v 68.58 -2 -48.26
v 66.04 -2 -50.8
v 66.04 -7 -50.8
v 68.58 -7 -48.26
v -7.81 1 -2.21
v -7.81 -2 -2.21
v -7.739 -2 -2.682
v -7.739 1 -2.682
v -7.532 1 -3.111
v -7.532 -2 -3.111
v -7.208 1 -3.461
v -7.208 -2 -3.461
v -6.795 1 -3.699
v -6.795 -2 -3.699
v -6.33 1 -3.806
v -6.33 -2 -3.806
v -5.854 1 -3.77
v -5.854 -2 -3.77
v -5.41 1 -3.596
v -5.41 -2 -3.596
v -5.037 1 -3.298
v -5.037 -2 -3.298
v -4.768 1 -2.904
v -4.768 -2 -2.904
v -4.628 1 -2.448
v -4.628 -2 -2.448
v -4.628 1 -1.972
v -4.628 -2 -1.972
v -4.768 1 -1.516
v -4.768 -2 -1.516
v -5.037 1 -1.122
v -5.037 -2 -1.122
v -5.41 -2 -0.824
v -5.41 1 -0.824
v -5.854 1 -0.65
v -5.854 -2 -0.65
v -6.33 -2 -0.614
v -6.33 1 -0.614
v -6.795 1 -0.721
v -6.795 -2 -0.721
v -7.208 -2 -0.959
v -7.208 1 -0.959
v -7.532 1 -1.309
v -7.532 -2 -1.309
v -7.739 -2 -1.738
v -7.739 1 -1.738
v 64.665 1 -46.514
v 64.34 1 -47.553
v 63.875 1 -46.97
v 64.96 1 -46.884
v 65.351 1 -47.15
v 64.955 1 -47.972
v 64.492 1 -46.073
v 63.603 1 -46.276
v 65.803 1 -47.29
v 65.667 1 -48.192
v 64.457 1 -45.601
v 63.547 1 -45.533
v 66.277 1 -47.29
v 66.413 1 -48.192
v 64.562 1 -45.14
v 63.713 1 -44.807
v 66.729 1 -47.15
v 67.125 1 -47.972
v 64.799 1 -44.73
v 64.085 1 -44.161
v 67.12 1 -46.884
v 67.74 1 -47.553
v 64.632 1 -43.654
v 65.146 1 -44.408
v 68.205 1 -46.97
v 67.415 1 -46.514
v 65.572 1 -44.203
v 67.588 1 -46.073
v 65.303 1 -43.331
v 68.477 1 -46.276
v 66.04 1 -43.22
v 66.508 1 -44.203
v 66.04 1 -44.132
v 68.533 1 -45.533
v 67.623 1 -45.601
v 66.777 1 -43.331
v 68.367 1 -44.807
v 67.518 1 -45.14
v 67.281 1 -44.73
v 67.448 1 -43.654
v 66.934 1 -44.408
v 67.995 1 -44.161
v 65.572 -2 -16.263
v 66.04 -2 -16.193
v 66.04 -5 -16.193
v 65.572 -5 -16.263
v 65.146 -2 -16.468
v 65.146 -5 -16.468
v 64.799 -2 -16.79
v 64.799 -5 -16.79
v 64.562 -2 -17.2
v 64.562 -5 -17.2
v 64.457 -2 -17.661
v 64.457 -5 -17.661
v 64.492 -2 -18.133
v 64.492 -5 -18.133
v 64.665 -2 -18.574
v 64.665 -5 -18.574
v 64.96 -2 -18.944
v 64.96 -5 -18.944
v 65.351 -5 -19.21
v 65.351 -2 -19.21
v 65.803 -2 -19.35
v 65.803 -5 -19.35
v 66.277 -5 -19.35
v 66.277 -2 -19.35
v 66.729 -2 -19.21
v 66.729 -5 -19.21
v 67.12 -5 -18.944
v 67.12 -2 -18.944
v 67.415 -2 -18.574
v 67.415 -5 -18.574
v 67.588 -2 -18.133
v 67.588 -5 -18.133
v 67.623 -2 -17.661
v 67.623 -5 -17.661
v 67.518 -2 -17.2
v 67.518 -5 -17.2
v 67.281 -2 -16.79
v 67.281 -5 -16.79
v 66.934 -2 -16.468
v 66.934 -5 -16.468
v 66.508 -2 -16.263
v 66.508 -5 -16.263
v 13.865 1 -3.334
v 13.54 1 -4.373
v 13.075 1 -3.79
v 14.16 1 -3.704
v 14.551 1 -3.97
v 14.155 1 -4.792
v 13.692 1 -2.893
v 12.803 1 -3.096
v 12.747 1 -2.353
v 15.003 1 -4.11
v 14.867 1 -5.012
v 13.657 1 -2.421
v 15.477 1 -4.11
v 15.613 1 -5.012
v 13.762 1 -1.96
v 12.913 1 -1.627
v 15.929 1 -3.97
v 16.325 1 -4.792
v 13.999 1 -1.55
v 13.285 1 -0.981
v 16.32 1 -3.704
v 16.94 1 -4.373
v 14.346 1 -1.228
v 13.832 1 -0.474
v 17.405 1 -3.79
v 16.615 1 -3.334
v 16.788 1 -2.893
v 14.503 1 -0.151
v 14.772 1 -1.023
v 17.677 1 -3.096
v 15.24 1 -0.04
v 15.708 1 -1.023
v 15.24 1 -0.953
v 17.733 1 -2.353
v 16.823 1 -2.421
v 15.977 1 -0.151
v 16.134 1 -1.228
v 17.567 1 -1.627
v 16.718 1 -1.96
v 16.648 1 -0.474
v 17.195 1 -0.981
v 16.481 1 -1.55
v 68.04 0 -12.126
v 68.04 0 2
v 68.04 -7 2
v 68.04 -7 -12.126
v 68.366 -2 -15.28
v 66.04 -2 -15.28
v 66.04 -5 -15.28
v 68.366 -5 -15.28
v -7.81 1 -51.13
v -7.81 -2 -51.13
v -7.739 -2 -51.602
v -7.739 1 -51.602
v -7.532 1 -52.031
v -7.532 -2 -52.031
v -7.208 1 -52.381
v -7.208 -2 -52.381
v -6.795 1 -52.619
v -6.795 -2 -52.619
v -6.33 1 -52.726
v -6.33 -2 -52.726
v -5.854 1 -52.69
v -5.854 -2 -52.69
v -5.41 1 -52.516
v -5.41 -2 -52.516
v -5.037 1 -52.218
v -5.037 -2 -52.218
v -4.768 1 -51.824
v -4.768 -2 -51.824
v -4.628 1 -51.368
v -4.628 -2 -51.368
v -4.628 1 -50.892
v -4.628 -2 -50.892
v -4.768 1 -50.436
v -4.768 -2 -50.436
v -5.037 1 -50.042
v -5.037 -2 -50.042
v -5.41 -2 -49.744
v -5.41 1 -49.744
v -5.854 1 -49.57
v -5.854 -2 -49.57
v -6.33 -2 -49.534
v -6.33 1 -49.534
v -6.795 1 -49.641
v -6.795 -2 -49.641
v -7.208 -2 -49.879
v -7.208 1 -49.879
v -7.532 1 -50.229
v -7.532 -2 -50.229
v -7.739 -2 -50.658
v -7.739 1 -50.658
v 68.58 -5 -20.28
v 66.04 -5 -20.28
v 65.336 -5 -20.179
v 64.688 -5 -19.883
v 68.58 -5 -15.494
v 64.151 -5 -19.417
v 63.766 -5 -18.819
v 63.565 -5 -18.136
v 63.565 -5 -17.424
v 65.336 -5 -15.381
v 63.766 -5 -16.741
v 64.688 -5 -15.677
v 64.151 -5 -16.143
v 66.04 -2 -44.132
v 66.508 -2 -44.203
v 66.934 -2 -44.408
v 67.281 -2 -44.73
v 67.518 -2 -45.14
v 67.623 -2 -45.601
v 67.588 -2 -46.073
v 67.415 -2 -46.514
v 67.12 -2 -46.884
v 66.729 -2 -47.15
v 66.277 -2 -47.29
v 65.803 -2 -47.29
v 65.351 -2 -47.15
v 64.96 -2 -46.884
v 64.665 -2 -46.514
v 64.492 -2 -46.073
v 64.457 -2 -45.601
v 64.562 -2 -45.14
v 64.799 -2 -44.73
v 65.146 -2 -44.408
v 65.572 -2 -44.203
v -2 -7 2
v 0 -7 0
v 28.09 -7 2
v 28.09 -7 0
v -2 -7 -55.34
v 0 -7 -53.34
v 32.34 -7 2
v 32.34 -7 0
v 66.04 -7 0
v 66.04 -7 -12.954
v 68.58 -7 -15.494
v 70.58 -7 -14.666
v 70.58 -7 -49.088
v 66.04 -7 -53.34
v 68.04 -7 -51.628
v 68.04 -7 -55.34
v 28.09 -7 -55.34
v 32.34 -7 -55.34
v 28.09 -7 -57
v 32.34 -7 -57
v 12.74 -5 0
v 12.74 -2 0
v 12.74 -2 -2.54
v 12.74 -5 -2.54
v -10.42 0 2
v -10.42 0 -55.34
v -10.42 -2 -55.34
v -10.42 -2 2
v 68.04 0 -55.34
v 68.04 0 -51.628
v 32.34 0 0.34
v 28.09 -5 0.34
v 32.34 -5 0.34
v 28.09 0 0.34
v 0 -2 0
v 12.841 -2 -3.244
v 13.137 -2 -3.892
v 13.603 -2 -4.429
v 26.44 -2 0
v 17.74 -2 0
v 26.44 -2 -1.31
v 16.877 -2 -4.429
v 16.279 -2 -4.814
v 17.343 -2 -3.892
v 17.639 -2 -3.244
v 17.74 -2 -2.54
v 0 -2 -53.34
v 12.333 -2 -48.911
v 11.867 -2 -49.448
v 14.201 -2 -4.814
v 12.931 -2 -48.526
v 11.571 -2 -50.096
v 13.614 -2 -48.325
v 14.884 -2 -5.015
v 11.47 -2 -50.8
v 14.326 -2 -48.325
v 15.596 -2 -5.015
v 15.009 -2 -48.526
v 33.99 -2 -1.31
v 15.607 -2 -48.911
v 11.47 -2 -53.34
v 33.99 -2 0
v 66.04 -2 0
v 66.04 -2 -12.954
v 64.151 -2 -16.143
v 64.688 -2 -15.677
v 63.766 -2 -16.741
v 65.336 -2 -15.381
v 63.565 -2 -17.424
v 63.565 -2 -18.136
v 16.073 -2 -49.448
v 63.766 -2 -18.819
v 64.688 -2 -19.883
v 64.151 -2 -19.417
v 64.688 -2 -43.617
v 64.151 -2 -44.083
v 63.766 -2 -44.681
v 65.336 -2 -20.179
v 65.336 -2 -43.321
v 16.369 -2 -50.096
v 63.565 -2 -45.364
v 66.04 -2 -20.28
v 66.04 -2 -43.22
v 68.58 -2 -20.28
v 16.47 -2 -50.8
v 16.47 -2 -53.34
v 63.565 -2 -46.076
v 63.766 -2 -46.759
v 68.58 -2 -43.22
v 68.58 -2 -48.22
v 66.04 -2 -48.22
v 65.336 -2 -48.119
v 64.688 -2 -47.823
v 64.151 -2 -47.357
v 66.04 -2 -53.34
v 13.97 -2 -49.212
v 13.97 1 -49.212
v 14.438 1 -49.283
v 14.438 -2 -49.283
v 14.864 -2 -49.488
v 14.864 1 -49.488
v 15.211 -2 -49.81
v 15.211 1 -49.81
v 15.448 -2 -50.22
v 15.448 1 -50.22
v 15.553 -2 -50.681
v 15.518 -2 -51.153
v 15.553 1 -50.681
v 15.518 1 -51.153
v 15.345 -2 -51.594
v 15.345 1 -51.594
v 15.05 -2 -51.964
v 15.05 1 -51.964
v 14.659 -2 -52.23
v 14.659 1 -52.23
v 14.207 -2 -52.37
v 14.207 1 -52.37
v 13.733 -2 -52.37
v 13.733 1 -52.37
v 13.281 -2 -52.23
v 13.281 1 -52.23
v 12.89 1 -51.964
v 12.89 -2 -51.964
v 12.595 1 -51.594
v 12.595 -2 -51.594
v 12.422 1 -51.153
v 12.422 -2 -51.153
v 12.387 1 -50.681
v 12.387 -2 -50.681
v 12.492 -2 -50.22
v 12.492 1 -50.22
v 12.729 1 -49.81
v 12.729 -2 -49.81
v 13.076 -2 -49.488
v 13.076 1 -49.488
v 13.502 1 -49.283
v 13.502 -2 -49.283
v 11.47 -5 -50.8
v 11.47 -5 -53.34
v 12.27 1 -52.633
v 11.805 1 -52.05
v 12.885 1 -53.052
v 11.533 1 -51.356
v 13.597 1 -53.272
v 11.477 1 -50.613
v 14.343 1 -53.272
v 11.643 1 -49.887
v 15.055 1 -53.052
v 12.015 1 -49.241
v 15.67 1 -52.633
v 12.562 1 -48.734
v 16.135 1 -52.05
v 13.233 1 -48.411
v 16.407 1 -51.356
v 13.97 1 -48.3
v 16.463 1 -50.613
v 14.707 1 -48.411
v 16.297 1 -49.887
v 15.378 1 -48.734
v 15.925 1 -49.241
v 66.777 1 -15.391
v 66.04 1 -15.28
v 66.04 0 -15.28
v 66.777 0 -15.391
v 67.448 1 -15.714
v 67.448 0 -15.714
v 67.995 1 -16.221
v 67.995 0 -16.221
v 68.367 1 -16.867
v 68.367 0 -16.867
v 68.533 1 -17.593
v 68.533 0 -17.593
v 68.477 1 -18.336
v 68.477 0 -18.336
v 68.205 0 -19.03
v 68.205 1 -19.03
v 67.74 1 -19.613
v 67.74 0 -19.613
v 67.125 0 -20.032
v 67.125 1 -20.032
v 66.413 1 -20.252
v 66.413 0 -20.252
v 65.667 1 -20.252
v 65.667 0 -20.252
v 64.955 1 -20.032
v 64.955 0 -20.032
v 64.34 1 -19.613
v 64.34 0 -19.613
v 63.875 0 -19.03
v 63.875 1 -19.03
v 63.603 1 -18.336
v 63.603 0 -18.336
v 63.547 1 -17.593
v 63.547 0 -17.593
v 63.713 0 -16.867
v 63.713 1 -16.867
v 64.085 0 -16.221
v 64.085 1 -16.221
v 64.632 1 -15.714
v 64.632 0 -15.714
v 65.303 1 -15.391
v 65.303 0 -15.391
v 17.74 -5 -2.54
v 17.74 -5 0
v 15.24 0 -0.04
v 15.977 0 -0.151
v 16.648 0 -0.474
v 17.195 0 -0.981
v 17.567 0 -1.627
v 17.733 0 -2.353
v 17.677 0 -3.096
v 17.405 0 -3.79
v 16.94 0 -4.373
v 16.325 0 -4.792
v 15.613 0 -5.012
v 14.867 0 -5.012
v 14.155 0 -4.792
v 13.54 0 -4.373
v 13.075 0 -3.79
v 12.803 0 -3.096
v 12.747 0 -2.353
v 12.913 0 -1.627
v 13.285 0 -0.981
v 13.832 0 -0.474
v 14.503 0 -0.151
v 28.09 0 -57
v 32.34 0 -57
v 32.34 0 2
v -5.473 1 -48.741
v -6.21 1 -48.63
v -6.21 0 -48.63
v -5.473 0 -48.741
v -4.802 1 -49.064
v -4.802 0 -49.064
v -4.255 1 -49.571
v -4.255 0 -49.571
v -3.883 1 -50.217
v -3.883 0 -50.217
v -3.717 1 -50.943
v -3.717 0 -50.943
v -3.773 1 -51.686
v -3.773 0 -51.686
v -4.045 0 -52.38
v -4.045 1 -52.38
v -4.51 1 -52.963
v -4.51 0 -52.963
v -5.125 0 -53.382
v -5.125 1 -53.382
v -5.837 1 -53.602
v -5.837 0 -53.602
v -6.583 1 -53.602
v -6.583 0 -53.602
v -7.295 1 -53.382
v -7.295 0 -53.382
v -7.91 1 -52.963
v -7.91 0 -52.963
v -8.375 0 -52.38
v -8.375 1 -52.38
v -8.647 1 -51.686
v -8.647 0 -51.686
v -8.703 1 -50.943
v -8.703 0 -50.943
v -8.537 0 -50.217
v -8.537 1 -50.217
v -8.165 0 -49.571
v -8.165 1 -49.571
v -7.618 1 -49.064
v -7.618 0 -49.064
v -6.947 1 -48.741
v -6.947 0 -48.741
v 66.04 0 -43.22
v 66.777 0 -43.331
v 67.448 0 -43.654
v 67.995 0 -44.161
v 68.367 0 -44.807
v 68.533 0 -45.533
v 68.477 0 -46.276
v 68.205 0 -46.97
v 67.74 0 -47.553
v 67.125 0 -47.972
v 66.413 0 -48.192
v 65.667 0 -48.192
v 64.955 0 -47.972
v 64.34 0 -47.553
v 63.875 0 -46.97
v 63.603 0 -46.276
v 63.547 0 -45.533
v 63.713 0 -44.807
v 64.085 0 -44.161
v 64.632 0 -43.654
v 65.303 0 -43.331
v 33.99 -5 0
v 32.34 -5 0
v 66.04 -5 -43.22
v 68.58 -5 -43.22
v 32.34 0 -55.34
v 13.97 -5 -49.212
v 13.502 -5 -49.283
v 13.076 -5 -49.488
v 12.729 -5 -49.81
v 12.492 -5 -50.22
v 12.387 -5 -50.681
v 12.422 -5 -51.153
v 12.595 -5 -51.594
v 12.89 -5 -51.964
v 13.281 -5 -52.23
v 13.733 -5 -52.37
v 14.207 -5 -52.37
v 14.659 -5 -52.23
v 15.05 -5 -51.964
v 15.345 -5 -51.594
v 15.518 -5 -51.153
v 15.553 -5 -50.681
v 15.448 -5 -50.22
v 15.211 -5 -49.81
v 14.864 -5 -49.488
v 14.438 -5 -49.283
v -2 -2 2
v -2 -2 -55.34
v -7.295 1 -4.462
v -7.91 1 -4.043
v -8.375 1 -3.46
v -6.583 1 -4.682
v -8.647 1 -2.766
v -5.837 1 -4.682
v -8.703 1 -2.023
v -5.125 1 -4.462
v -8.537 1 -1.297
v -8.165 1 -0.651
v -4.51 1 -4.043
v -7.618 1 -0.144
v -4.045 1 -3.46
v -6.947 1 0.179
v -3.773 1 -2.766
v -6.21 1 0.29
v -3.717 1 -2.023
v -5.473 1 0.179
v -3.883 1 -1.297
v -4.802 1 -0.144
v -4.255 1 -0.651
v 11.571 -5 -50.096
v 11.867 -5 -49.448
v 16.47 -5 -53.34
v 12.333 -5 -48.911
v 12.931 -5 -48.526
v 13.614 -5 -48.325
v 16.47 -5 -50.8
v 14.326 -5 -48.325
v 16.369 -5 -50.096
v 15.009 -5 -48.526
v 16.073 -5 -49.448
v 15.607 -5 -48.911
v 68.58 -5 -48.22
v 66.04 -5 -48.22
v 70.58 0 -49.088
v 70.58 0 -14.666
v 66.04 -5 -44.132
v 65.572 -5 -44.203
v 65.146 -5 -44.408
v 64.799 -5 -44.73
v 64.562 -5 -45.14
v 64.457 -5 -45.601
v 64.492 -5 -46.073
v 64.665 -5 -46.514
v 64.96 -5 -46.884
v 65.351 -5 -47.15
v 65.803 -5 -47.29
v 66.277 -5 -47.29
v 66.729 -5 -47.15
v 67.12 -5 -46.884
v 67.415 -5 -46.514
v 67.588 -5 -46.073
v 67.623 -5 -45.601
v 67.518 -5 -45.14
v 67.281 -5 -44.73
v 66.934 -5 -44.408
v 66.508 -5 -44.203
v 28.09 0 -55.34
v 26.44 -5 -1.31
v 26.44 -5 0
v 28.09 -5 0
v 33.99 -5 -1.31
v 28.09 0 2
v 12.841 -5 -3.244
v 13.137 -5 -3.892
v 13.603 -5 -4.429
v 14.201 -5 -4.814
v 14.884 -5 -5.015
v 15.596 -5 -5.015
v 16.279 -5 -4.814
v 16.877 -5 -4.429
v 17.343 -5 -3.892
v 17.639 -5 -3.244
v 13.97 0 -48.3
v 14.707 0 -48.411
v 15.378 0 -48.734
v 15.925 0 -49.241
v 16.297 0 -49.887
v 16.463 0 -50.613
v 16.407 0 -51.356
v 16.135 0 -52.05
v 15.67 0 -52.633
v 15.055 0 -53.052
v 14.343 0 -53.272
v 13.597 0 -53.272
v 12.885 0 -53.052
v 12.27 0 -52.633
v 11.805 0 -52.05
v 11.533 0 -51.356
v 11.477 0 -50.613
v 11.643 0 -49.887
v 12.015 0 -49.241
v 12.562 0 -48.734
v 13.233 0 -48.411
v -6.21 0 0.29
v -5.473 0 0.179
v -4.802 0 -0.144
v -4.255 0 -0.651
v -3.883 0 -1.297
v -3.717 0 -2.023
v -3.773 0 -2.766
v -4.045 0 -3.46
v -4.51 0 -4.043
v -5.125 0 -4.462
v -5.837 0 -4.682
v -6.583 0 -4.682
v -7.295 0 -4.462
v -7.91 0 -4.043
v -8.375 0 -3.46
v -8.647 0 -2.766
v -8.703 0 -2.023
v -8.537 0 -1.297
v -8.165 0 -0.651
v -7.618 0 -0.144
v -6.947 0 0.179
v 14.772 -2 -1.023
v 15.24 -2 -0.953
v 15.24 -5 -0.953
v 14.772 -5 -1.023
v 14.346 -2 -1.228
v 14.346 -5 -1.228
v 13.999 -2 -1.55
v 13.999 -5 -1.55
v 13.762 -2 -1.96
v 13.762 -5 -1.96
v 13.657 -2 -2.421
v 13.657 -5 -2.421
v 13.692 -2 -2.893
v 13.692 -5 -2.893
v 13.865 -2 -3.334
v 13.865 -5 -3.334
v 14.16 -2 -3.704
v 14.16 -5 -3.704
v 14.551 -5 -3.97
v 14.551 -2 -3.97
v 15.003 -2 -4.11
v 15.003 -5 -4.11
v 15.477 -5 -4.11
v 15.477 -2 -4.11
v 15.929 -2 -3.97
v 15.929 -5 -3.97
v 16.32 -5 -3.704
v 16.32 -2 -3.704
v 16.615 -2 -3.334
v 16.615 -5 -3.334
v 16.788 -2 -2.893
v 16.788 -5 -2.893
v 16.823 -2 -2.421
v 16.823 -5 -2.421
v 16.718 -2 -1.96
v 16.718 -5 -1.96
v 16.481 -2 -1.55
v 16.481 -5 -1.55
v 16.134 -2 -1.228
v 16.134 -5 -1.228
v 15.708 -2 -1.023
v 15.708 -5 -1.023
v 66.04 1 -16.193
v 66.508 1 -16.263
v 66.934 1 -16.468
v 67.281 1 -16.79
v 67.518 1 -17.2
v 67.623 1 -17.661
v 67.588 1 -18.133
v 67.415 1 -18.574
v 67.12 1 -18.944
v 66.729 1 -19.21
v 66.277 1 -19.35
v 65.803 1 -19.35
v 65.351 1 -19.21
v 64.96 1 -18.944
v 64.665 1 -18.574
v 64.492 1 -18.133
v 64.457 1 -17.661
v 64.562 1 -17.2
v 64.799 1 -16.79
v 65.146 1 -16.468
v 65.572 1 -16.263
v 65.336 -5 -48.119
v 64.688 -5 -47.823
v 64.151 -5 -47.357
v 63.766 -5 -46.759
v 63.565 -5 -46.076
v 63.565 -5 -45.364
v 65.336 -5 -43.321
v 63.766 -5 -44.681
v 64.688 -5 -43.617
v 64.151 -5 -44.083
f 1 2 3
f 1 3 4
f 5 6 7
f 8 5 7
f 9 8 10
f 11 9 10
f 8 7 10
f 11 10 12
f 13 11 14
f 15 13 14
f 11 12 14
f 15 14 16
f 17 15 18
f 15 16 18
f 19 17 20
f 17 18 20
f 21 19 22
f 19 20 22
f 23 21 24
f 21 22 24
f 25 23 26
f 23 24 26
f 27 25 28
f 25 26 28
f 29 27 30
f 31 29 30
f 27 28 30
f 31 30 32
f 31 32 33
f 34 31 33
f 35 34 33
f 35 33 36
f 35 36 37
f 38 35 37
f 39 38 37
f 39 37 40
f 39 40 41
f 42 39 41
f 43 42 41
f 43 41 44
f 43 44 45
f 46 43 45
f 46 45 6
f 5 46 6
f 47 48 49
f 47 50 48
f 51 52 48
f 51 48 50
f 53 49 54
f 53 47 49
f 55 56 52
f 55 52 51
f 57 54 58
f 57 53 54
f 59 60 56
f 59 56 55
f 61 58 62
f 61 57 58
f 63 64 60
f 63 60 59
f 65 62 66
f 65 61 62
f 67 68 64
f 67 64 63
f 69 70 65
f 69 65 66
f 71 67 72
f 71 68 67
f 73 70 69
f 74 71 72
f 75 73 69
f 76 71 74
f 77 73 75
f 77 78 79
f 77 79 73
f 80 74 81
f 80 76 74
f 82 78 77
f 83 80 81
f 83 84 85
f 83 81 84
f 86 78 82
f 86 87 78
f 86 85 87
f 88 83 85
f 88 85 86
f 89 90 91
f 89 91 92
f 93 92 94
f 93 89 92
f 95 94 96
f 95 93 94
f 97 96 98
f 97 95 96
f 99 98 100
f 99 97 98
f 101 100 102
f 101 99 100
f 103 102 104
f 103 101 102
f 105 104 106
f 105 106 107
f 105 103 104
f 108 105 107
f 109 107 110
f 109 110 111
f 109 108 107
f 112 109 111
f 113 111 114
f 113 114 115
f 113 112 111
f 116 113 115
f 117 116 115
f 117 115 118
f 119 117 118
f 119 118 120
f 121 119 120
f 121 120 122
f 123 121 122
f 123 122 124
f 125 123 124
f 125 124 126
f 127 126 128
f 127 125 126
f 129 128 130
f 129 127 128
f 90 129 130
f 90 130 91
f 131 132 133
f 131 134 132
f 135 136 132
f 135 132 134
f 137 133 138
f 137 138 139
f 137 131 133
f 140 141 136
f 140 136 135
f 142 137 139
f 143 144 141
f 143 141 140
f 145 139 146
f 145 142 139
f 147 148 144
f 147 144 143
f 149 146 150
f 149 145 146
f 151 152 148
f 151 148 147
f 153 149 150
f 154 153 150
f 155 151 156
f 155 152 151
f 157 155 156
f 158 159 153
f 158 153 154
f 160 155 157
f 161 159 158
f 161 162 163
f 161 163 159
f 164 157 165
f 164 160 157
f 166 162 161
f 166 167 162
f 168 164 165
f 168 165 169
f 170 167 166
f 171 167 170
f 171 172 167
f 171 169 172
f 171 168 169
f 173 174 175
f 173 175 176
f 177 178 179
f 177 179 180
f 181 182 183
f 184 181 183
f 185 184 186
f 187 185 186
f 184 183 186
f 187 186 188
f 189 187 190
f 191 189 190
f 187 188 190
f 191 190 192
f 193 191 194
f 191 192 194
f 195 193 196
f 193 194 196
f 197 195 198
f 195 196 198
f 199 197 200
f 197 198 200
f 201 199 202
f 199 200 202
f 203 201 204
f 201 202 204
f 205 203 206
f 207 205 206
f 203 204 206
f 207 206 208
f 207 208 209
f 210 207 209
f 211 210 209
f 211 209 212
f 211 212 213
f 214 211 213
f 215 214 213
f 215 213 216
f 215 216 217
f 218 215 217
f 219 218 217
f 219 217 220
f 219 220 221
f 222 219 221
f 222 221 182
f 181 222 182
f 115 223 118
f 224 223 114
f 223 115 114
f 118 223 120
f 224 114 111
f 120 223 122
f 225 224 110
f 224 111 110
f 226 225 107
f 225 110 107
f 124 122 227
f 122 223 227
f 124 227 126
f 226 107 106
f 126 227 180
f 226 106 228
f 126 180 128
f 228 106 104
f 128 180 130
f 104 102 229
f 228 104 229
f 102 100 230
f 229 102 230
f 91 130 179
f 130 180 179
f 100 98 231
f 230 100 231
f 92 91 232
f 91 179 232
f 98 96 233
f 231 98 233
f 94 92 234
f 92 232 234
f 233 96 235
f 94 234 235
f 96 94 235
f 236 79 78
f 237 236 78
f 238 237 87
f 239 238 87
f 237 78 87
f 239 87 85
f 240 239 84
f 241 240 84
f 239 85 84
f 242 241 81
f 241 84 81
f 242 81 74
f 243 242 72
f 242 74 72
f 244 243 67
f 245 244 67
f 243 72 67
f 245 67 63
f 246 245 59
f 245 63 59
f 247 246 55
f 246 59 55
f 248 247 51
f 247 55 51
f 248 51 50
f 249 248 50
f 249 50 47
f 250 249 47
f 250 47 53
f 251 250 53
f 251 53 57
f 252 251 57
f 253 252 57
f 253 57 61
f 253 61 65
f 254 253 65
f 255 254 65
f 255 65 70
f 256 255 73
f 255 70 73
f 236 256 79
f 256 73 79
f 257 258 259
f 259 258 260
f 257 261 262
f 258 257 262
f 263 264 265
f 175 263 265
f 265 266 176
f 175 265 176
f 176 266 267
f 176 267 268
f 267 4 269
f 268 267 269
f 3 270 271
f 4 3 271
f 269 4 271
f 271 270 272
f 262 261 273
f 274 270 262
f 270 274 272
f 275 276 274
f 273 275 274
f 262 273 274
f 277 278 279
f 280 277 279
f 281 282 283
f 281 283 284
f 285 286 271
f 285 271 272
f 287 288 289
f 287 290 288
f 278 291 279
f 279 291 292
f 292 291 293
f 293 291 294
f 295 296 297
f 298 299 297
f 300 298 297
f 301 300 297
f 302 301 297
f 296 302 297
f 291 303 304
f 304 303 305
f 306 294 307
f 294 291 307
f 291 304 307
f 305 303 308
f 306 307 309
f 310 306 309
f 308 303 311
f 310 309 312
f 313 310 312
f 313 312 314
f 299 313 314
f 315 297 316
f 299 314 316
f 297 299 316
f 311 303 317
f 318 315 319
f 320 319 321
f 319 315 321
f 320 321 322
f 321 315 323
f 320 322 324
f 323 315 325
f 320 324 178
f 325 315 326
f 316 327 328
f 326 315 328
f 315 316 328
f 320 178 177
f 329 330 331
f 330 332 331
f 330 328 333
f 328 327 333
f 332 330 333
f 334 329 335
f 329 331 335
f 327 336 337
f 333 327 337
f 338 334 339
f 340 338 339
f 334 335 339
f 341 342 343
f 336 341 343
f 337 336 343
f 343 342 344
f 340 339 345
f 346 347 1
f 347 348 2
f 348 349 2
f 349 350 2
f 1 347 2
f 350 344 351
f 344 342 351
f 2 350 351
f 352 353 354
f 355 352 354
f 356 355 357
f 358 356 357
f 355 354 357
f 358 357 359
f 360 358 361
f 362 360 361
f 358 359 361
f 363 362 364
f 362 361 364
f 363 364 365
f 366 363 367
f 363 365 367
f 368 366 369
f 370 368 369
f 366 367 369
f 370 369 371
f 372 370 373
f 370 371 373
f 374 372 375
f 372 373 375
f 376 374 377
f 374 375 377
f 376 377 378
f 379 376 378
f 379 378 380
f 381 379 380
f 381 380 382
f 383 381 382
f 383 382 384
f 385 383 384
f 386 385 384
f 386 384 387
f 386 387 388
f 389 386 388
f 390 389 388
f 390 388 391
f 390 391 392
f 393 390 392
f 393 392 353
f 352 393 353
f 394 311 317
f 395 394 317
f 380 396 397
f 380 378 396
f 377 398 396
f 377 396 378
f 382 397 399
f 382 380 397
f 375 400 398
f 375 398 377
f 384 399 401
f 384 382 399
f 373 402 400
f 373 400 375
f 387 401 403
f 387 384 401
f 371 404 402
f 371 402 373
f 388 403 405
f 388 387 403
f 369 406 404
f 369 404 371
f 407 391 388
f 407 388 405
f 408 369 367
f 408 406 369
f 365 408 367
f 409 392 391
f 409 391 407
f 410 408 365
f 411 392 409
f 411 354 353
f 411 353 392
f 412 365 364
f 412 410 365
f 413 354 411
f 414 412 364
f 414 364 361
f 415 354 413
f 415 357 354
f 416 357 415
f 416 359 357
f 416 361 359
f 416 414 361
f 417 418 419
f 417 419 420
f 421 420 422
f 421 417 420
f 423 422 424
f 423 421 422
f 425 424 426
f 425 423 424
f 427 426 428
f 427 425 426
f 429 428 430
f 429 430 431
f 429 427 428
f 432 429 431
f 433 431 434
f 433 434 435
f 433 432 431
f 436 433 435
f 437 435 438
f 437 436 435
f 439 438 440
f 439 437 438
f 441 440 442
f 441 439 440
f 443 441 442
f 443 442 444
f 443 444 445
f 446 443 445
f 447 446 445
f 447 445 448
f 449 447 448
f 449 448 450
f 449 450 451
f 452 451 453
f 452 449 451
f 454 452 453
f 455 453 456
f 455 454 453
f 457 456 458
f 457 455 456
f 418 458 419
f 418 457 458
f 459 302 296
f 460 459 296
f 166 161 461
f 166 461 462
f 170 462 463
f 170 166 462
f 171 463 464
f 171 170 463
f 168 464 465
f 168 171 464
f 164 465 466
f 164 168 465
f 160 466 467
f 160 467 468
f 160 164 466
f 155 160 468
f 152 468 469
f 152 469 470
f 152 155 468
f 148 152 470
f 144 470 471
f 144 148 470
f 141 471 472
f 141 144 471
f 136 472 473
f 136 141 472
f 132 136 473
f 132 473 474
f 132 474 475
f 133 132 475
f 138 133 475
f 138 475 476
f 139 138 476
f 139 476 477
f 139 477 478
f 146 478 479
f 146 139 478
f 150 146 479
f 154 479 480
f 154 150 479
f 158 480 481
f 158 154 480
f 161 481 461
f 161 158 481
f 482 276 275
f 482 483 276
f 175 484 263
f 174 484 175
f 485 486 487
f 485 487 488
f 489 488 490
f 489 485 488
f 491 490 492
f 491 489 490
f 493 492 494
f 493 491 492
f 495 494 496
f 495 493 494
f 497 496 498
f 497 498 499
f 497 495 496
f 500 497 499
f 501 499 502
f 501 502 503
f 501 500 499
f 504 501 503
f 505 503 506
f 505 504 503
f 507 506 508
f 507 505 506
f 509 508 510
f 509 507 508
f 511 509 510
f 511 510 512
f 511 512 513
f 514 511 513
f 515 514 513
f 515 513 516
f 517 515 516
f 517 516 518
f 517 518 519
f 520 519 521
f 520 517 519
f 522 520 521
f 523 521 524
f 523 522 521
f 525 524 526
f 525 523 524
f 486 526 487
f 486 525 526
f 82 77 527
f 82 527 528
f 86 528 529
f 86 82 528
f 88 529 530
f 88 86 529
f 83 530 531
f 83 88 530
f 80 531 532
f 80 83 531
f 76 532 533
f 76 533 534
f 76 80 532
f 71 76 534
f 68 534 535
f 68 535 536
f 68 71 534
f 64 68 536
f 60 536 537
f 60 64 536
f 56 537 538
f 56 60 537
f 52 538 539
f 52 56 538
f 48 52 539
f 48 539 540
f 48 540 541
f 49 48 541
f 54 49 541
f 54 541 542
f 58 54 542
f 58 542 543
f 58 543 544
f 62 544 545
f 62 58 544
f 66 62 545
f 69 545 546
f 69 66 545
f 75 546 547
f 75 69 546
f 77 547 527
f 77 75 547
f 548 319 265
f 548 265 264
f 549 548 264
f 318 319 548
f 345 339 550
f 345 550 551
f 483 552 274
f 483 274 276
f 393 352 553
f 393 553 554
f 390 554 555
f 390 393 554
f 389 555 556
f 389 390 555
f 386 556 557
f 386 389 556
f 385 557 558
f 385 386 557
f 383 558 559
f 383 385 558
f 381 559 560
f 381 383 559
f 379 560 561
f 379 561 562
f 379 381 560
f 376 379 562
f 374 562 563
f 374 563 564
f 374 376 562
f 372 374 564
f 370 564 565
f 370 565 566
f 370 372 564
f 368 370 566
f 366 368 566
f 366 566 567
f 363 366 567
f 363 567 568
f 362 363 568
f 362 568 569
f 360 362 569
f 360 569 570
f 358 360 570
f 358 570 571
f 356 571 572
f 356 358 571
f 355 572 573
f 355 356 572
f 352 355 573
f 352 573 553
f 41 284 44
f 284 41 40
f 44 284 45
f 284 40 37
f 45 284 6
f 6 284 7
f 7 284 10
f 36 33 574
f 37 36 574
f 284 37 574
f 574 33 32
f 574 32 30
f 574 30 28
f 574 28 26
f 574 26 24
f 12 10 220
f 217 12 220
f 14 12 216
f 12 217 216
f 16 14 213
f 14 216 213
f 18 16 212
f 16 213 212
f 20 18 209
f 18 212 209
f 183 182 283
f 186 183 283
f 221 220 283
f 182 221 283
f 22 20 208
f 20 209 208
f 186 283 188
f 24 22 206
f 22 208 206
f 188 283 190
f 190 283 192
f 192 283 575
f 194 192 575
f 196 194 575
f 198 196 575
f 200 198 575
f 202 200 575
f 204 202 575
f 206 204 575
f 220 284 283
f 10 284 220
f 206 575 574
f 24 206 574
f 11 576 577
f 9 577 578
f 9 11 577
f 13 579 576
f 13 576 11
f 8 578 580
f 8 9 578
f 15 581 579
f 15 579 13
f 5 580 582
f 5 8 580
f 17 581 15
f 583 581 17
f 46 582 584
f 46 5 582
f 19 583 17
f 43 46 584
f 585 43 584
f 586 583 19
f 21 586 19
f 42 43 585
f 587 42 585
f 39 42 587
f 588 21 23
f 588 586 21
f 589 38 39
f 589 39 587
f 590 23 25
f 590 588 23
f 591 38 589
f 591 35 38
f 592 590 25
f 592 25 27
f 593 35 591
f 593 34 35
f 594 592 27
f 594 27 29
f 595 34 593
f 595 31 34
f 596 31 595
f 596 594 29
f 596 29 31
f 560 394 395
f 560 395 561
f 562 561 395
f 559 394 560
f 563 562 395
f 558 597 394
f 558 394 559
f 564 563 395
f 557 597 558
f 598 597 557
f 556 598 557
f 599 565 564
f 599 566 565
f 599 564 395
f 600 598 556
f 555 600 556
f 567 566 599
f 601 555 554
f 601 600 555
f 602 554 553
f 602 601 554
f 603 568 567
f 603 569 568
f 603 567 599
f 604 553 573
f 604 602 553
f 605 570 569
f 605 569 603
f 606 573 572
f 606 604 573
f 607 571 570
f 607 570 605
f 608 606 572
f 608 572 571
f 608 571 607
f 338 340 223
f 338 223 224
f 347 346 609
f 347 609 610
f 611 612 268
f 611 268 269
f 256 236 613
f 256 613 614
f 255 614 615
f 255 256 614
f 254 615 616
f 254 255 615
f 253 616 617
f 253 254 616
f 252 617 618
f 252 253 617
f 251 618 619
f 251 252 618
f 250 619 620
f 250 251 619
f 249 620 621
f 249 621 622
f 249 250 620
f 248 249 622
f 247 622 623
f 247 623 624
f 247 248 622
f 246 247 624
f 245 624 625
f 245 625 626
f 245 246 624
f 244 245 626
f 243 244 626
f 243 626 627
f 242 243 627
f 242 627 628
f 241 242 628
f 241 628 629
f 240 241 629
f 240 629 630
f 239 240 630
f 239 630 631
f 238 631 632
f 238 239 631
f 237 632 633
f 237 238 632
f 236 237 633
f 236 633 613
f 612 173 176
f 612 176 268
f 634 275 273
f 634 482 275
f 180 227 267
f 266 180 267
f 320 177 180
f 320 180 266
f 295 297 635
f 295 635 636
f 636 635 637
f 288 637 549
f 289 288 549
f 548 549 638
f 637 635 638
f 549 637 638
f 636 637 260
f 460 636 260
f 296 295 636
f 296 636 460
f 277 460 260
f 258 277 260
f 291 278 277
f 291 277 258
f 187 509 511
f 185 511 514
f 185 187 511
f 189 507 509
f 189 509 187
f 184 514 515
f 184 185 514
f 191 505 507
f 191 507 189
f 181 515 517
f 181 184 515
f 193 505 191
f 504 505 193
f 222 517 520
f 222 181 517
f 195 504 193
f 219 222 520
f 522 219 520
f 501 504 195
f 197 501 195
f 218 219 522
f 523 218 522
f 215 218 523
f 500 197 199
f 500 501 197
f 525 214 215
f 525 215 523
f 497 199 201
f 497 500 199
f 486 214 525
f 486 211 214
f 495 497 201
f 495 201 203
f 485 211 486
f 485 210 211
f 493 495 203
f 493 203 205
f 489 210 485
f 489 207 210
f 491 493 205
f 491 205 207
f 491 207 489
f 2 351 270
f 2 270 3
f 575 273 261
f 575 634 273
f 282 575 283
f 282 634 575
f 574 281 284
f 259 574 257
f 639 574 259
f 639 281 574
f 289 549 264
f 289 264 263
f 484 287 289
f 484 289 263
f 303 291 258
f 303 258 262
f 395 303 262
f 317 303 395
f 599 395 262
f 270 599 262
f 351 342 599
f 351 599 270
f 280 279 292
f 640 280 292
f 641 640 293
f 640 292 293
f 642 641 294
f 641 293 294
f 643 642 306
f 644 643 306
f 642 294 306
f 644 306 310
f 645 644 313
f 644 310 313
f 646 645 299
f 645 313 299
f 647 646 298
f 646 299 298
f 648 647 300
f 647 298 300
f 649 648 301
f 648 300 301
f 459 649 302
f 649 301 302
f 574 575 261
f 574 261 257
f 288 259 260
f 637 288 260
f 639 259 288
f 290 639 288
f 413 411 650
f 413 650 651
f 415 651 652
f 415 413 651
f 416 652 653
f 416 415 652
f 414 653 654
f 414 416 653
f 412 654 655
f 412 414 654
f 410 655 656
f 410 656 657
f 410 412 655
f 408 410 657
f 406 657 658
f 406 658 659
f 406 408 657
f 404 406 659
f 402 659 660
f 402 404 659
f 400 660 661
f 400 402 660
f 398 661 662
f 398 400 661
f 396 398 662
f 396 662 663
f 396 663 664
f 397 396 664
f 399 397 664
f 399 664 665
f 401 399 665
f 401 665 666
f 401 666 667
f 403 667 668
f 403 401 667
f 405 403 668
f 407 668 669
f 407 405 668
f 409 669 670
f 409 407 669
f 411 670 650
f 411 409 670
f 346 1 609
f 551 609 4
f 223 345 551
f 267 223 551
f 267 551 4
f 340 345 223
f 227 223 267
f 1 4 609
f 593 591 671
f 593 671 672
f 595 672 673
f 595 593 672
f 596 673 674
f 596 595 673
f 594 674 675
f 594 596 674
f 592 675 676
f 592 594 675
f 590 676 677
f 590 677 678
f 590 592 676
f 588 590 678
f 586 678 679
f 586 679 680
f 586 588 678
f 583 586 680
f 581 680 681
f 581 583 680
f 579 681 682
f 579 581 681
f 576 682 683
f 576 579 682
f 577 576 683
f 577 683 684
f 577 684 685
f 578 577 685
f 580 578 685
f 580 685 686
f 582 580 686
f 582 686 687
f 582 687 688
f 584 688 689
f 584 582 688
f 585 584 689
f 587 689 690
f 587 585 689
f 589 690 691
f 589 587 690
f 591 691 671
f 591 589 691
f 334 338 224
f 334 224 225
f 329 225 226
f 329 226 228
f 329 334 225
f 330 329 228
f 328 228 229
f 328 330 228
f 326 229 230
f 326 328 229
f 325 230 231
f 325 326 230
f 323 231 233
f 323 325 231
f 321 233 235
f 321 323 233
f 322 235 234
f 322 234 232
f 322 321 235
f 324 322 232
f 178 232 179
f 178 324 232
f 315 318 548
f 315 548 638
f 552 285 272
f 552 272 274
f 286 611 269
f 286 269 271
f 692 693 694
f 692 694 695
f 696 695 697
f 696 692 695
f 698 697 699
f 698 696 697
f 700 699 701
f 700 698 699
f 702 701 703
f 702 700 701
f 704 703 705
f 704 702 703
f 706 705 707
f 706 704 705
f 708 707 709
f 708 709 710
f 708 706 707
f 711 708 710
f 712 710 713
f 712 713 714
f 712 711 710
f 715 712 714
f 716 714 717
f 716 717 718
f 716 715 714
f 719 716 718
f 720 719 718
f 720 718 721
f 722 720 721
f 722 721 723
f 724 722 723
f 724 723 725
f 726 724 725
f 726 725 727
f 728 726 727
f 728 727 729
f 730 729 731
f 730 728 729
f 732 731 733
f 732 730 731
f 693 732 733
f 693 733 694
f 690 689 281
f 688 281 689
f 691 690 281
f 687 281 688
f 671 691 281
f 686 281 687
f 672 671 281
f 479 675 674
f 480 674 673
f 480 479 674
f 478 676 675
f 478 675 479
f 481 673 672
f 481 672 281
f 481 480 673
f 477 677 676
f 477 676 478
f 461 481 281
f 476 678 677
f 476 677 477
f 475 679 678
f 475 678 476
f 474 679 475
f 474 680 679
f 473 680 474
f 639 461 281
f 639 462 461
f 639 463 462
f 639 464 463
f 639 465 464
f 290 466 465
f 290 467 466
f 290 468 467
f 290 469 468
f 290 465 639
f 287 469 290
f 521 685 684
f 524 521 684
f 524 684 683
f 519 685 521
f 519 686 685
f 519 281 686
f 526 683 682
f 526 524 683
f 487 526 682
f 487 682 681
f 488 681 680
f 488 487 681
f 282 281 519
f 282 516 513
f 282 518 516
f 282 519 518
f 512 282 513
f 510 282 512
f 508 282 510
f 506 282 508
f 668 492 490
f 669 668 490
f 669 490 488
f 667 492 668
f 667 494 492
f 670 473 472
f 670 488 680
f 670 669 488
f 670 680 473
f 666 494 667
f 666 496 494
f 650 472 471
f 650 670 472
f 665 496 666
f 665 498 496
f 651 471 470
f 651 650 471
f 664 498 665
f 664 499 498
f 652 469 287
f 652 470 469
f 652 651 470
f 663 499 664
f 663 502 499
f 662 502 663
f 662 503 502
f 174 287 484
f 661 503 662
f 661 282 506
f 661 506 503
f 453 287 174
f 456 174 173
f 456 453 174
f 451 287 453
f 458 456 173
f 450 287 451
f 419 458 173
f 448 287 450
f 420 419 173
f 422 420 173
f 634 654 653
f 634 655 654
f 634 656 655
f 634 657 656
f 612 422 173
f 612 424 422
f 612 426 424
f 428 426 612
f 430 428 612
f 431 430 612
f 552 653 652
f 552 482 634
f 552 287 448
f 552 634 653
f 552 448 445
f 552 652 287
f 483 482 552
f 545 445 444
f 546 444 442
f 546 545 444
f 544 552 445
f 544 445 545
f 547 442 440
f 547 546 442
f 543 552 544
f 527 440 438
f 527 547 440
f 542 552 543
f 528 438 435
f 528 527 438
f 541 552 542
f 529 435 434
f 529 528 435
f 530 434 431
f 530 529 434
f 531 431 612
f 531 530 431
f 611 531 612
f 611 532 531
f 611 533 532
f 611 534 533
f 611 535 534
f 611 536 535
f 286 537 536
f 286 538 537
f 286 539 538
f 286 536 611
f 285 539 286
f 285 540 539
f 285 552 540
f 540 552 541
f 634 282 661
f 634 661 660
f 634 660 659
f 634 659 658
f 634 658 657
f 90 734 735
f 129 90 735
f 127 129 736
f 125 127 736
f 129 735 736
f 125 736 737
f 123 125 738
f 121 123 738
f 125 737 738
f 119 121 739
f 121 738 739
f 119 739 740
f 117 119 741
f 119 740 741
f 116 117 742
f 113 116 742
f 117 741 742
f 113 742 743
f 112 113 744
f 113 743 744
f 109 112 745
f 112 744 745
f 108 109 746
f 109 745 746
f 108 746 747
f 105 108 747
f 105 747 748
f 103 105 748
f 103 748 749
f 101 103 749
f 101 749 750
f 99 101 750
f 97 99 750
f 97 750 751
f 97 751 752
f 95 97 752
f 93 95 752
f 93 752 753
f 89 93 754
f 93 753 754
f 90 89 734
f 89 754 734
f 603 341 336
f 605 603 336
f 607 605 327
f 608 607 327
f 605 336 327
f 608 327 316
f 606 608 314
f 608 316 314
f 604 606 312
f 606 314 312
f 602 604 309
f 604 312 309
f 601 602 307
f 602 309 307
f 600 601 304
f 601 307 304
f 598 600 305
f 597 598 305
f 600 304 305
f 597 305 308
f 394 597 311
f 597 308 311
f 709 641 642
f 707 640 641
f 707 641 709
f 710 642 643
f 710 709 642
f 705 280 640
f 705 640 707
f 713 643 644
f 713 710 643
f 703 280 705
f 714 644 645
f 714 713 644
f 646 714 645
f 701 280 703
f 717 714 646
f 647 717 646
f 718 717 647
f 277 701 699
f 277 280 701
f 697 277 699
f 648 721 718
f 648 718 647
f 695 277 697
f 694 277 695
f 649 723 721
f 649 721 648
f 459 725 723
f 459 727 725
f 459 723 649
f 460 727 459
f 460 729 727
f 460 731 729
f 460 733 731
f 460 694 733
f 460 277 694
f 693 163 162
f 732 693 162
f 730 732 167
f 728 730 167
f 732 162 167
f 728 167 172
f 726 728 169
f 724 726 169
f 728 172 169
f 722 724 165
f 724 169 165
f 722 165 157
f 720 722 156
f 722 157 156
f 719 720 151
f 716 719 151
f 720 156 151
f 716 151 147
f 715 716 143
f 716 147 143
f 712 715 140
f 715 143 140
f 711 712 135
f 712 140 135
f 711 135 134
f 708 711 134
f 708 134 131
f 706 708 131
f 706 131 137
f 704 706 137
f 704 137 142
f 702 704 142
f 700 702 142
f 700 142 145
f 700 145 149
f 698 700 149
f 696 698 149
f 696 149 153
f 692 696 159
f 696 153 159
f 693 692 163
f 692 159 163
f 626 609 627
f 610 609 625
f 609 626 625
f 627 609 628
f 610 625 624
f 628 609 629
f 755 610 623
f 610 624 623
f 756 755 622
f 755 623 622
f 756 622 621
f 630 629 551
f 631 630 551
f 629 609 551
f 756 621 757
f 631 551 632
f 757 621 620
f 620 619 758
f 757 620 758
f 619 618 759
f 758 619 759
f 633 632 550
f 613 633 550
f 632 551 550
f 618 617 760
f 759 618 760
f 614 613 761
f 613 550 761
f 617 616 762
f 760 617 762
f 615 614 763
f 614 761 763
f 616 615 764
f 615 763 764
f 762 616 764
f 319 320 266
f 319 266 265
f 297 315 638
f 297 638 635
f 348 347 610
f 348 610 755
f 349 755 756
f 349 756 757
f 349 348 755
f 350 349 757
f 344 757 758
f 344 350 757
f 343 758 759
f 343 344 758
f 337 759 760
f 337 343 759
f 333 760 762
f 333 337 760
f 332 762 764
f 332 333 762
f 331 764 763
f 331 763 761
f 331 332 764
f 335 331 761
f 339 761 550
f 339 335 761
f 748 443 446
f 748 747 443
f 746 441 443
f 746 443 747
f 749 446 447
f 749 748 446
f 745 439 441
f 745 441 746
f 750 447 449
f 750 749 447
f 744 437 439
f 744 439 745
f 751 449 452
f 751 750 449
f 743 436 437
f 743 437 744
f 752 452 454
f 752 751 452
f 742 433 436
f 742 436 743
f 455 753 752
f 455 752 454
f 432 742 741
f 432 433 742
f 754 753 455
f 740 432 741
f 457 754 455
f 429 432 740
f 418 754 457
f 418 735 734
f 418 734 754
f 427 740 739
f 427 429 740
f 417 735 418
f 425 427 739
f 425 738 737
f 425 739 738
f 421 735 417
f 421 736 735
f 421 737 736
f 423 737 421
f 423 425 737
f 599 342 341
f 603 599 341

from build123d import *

# Parameters (mm, degrees)
SKETCH1_R            = 1.5875
BOSS_EXTRUDE1_DEPTH  = 2
BOSS_EXTRUDE2_START  = -2
BOSS_EXTRUDE2_DEPTH  = 5
BOSS_EXTRUDE3_START  = 1
SKETCH2_R            = 2.5
SKETCH2_R_2          = 1.5875
BOSS_EXTRUDE3_DEPTH  = 1
BOSS_EXTRUDE4_START  = -2
SKETCH1_4_W          = 4.25
SKETCH1_4_H          = 0.34
BOSS_EXTRUDE4_DEPTH  = 3
SKETCH3_R            = 1.5875
BOSS_EXTRUDE5_DEPTH  = 3
M3_CLEARANCE_HOLE1_D = 3.2


with BuildPart() as part:
    # Sketch1 → Boss-Extrude1 (new body)
    with BuildSketch(Plane(origin=(0, 0, 0), x_dir=(1, 0, 0), z_dir=(0, 1, 0))):
        Polygon((-10.42, 55.34), (-10.42, -2), (28.09, -2), (28.09, -0.34), (32.34, -0.34), (32.34, -2), (68.04, -2), (68.04, 12.125572875), (70.58, 14.665572875), (70.58, 49.088427125), (68.04, 51.628427125), (68.04, 55.34), (32.34, 55.34), (32.34, 57), (28.09, 57), (28.09, 55.34), align=None)
        with Locations(Location((15.24, 2.54, 0), (0, 0, 270))):
            Circle(SKETCH1_R, mode=Mode.SUBTRACT)
        with Locations(Location((66.04, 45.72, 0), (0, 0, 270))):
            Circle(SKETCH1_R, mode=Mode.SUBTRACT)
        with Locations(Location((13.97, 50.8, 0), (0, 0, 270))):
            Circle(SKETCH1_R, mode=Mode.SUBTRACT)
        with Locations(Location((66.04, 17.78, 0), (0, 0, 270))):
            Circle(SKETCH1_R, mode=Mode.SUBTRACT)
    extrude(amount=-BOSS_EXTRUDE1_DEPTH)

    # Sketch1<3> → Boss-Extrude2 (add)
    with BuildSketch(Plane(origin=(0, 0, 0), x_dir=(1, 0, 0), z_dir=(0, 1, 0)).offset(BOSS_EXTRUDE2_START)):
        Polygon((28.09, 55.34), (-2, 55.34), (-2, -2), (28.09, -2), (28.09, 0), (0, 0), (0, 53.34), (66.04, 53.34), (66.04, 50.8), (68.58, 48.26), (68.58, 15.494), (66.04, 12.954), (66.04, 0), (32.34, 0), (32.34, -2), (68.04, -2), (68.04, 12.125572875), (70.58, 14.665572875), (70.58, 49.088427125), (68.04, 51.628427125), (68.04, 55.34), (32.34, 55.34), (32.34, 57), (28.09, 57), align=None)
    extrude(amount=-BOSS_EXTRUDE2_DEPTH)

    # Sketch2 → Boss-Extrude3 (add)
    # profile 1 of 6: a face of its own
    with BuildSketch(Plane(origin=(0, 0, 0), x_dir=(1, 0, 0), z_dir=(0, 1, 0)).offset(BOSS_EXTRUDE3_START)):
        with Locations(Location((13.97, 50.8, 0), (0, 0, 270))):
            Circle(SKETCH2_R)
        with Locations(Location((13.97, 50.8, 0), (0, 0, 270))):
            Circle(SKETCH2_R_2, mode=Mode.SUBTRACT)
    # profile 2 of 6: a face of its own
    with BuildSketch(Plane(origin=(0, 0, 0), x_dir=(1, 0, 0), z_dir=(0, 1, 0)).offset(BOSS_EXTRUDE3_START)):
        with Locations(Location((66.04, 45.72, 0), (0, 0, 270))):
            Circle(SKETCH2_R)
        with Locations(Location((66.04, 45.72, 0), (0, 0, 270))):
            Circle(SKETCH2_R_2, mode=Mode.SUBTRACT)
    # profile 3 of 6: a face of its own
    with BuildSketch(Plane(origin=(0, 0, 0), x_dir=(1, 0, 0), z_dir=(0, 1, 0)).offset(BOSS_EXTRUDE3_START)):
        with Locations(Location((66.04, 17.78, 0), (0, 0, 270))):
            Circle(SKETCH2_R)
        with Locations(Location((66.04, 17.78, 0), (0, 0, 270))):
            Circle(SKETCH2_R_2, mode=Mode.SUBTRACT)
    # profile 4 of 6: a face of its own
    with BuildSketch(Plane(origin=(0, 0, 0), x_dir=(1, 0, 0), z_dir=(0, 1, 0)).offset(BOSS_EXTRUDE3_START)):
        with Locations(Location((15.24, 2.54, 0), (0, 0, 270))):
            Circle(SKETCH2_R)
        with Locations(Location((15.24, 2.54, 0), (0, 0, 270))):
            Circle(SKETCH2_R_2, mode=Mode.SUBTRACT)
    # profile 5 of 6: a face of its own
    with BuildSketch(Plane(origin=(0, 0, 0), x_dir=(1, 0, 0), z_dir=(0, 1, 0)).offset(BOSS_EXTRUDE3_START)):
        with Locations(Location((-6.21, 2.21, 0), (0, 0, 270))):
            Circle(SKETCH2_R)
    # profile 6 of 6: a face of its own
    with BuildSketch(Plane(origin=(0, 0, 0), x_dir=(1, 0, 0), z_dir=(0, 1, 0)).offset(BOSS_EXTRUDE3_START)):
        with Locations(Location((-6.21, 51.13, 0), (0, 0, 270))):
            Circle(SKETCH2_R)
    extrude(amount=-BOSS_EXTRUDE3_DEPTH)

    # Sketch1<4> → Boss-Extrude4 (add)
    with BuildSketch(Plane(origin=(0, 0, 0), x_dir=(1, 0, 0), z_dir=(0, 1, 0)).offset(BOSS_EXTRUDE4_START)):
        with Locations((30.215, -0.17)):
            Rectangle(SKETCH1_4_W, SKETCH1_4_H)
        Polygon((26.44, 0), (28.09, 0), (32.34, 0), (33.99, 0), (33.99, 1.31), (26.44, 1.31), align=None)
    extrude(amount=-BOSS_EXTRUDE4_DEPTH)

    # Sketch3 → Boss-Extrude5 (add)
    # profile 1 of 4: a face of its own
    with BuildSketch(Plane.XZ.offset(2)):
        with BuildLine():
            Line((12.74, 0), (12.74, -2.54))
            ThreePointArc((12.74, -2.54), (15.24, -5.04), (17.74, -2.54))
            Line((17.74, -2.54), (17.74, 0))
            Line((17.74, 0), (12.74, 0))
        make_face()
        with Locations(Location((15.24, -2.54, 0), (0, 0, 90))):
            Circle(SKETCH3_R, mode=Mode.SUBTRACT)
    # profile 2 of 4: a face of its own
    with BuildSketch(Plane.XZ.offset(2)):
        with BuildLine():
            Line((16.47, -53.34), (16.47, -50.8))
            ThreePointArc((16.47, -50.8), (13.97, -48.3), (11.47, -50.8))
            Line((11.47, -50.8), (11.47, -53.34))
            Line((11.47, -53.34), (16.47, -53.34))
        make_face()
        with Locations(Location((13.97, -50.8, 0), (0, 0, 90))):
            Circle(SKETCH3_R, mode=Mode.SUBTRACT)
    # profile 3 of 4: a face of its own
    with BuildSketch(Plane.XZ.offset(2)):
        with BuildLine():
            Line((68.58, -48.22), (66.04, -48.22))
            ThreePointArc((66.04, -48.22), (63.54, -45.72), (66.04, -43.22))
            Line((66.04, -43.22), (68.58, -43.22))
            Line((68.58, -43.22), (68.58, -48.22))
        make_face()
        with Locations(Location((66.04, -45.72, 0), (0, 0, 90))):
            Circle(SKETCH3_R, mode=Mode.SUBTRACT)
    # profile 4 of 4: a face of its own
    with BuildSketch(Plane.XZ.offset(2)):
        with BuildLine():
            Line((68.58, -20.28), (66.04, -20.28))
            ThreePointArc((66.04, -20.28), (63.54, -17.78), (66.04, -15.28))
            Line((66.04, -15.28), (68.58, -15.28))
            Line((68.58, -15.28), (68.58, -20.28))
        make_face()
        with Locations(Location((66.04, -17.78, 0), (0, 0, 90))):
            Circle(SKETCH3_R, mode=Mode.SUBTRACT)
    extrude(amount=BOSS_EXTRUDE5_DEPTH)

    # M3 Clearance Hole1 (through all)
    with Locations(Plane(origin=(0, 1, 0), x_dir=(1, 0, 0), z_dir=(0, 1, 0))):
        with Locations((-6.21, 51.13), (-6.21, 2.21)):
            Hole(M3_CLEARANCE_HOLE1_D / 2)


solid = part.part
